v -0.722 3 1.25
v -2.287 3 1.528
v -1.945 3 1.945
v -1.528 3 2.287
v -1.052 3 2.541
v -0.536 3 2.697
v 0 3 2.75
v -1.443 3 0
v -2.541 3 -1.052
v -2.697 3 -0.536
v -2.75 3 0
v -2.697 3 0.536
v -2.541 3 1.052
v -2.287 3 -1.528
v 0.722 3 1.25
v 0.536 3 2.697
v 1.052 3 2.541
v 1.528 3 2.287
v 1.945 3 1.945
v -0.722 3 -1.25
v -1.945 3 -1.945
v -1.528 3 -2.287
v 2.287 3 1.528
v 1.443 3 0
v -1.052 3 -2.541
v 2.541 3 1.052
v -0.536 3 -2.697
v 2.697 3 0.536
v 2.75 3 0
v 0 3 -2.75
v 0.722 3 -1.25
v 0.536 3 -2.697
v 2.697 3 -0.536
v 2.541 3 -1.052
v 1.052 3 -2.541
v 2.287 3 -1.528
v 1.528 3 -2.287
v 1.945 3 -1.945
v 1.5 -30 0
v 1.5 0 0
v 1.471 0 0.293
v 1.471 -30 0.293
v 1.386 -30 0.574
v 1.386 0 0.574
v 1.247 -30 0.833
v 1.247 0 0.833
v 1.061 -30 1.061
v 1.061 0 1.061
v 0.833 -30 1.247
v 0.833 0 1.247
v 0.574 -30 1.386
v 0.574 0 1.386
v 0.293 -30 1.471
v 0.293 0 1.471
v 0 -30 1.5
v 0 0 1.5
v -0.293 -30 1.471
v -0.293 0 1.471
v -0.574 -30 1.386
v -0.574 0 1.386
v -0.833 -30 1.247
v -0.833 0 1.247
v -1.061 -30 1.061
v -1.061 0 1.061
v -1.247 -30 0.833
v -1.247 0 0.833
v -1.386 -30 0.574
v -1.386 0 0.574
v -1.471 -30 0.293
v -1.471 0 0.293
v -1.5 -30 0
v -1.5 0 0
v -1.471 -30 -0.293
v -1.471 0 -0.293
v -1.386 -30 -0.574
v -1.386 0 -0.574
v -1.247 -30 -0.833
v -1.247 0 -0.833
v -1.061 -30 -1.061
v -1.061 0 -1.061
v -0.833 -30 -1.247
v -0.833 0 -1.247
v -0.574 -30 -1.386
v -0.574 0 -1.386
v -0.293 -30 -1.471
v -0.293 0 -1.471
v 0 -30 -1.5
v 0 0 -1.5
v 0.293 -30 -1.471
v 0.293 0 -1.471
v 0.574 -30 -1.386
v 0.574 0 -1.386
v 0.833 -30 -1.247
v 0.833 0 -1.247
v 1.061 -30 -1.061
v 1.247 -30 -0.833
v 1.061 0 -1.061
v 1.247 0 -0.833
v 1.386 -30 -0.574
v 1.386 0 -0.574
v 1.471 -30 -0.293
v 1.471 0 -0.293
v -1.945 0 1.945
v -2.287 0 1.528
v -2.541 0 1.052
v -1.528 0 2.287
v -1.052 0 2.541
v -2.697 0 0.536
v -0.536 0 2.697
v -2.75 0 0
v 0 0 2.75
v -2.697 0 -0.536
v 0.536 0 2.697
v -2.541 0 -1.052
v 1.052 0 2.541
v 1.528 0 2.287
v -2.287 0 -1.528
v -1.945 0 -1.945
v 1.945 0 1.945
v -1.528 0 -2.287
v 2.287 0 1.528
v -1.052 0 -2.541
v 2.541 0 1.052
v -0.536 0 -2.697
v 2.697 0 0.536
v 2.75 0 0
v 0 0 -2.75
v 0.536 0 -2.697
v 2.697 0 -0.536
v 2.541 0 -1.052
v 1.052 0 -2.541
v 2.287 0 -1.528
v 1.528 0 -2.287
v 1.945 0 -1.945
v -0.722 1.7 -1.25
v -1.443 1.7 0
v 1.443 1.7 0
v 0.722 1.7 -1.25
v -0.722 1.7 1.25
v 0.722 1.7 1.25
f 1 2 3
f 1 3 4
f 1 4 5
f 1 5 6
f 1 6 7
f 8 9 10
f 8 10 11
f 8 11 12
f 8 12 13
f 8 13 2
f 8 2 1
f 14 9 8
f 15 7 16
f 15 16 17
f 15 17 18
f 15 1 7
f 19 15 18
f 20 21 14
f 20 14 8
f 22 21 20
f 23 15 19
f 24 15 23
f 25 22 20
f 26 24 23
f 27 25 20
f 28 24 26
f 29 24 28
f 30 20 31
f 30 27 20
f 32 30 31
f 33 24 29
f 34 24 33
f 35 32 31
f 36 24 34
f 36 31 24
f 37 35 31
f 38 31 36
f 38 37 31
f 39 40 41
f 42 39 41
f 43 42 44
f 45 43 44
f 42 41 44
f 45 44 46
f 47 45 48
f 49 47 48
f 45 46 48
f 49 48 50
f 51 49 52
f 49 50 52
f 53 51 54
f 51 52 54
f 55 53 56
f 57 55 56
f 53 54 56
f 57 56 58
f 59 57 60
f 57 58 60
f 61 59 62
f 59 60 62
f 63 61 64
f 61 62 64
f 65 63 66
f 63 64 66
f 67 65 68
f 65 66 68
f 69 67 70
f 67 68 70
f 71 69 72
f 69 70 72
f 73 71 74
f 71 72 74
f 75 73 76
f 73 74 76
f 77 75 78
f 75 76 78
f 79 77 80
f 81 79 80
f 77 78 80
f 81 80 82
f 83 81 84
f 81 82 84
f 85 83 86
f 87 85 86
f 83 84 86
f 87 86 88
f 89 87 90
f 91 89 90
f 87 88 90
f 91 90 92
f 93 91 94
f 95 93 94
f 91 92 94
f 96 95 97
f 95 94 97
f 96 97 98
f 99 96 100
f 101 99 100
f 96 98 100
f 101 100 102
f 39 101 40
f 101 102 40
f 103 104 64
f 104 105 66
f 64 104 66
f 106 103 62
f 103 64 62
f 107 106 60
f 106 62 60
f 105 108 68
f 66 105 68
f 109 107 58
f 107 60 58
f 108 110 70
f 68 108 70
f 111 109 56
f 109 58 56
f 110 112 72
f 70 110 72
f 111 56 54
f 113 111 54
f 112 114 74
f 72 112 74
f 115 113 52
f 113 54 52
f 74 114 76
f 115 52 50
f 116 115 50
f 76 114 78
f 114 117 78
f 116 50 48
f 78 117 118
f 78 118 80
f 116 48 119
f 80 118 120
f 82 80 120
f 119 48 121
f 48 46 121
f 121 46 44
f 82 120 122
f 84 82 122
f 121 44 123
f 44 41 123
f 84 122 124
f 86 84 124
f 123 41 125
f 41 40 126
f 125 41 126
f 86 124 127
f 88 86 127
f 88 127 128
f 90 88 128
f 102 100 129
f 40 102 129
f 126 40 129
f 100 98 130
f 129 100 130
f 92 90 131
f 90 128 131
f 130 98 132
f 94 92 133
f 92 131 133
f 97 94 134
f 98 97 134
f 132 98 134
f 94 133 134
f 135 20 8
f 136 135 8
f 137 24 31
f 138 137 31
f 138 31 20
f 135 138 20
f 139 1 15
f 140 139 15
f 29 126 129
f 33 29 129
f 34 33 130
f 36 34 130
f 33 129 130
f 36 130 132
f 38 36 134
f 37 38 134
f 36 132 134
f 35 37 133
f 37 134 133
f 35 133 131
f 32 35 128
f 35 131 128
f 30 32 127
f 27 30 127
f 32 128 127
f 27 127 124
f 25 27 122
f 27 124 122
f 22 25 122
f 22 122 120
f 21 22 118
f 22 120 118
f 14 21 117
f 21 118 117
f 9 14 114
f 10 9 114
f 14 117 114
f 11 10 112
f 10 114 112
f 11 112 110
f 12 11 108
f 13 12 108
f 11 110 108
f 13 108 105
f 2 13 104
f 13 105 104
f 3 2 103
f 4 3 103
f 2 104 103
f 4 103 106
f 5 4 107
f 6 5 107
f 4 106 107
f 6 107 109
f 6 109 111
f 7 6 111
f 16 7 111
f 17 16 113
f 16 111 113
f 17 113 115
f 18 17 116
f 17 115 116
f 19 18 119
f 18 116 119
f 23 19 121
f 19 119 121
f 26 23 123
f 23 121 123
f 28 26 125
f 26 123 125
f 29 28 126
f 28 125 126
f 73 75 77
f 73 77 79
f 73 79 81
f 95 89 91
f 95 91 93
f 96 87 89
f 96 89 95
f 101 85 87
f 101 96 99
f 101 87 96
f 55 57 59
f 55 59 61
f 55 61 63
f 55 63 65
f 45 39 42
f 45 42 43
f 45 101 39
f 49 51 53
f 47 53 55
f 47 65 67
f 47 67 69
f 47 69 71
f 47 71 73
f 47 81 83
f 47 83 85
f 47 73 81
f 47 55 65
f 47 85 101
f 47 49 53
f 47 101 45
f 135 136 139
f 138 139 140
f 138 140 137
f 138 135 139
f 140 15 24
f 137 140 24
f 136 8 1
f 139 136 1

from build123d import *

# Parameters (mm, degrees)
SKETCH_1_R            = 2.75
EXTRUDE_248_DEPTH     = 3
CUT_EXTRUDE_378_DEPTH = 1.3
SKETCH_3_R            = 1.5
EXTRUDE_479_DEPTH     = 30


with BuildPart() as part:
    # 草图1 → Extrude 248 (new body)
    with BuildSketch(Plane(origin=(0, 0, 0), x_dir=(1, 0, 0), z_dir=(0, 1, 0))):
        Circle(SKETCH_1_R)
    extrude(amount=EXTRUDE_248_DEPTH)

    # 草图2 → Cut-Extrude 378 (cut)
    with BuildSketch(Plane(origin=(0, 3, 0), x_dir=(1, 0, 0), z_dir=(0, 1, 0))):
        Polygon((1.443375673, 0), (0.721687836, 1.25), (-0.721687836, 1.25), (-1.443375673, 0), (-0.721687836, -1.25), (0.721687836, -1.25), align=None)
    extrude(amount=-CUT_EXTRUDE_378_DEPTH, mode=Mode.SUBTRACT)

    # 草图3 → Extrude 479 (add)
    with BuildSketch(Plane.XZ):
        Circle(SKETCH_3_R)
    extrude(amount=EXTRUDE_479_DEPTH)


solid = part.part
